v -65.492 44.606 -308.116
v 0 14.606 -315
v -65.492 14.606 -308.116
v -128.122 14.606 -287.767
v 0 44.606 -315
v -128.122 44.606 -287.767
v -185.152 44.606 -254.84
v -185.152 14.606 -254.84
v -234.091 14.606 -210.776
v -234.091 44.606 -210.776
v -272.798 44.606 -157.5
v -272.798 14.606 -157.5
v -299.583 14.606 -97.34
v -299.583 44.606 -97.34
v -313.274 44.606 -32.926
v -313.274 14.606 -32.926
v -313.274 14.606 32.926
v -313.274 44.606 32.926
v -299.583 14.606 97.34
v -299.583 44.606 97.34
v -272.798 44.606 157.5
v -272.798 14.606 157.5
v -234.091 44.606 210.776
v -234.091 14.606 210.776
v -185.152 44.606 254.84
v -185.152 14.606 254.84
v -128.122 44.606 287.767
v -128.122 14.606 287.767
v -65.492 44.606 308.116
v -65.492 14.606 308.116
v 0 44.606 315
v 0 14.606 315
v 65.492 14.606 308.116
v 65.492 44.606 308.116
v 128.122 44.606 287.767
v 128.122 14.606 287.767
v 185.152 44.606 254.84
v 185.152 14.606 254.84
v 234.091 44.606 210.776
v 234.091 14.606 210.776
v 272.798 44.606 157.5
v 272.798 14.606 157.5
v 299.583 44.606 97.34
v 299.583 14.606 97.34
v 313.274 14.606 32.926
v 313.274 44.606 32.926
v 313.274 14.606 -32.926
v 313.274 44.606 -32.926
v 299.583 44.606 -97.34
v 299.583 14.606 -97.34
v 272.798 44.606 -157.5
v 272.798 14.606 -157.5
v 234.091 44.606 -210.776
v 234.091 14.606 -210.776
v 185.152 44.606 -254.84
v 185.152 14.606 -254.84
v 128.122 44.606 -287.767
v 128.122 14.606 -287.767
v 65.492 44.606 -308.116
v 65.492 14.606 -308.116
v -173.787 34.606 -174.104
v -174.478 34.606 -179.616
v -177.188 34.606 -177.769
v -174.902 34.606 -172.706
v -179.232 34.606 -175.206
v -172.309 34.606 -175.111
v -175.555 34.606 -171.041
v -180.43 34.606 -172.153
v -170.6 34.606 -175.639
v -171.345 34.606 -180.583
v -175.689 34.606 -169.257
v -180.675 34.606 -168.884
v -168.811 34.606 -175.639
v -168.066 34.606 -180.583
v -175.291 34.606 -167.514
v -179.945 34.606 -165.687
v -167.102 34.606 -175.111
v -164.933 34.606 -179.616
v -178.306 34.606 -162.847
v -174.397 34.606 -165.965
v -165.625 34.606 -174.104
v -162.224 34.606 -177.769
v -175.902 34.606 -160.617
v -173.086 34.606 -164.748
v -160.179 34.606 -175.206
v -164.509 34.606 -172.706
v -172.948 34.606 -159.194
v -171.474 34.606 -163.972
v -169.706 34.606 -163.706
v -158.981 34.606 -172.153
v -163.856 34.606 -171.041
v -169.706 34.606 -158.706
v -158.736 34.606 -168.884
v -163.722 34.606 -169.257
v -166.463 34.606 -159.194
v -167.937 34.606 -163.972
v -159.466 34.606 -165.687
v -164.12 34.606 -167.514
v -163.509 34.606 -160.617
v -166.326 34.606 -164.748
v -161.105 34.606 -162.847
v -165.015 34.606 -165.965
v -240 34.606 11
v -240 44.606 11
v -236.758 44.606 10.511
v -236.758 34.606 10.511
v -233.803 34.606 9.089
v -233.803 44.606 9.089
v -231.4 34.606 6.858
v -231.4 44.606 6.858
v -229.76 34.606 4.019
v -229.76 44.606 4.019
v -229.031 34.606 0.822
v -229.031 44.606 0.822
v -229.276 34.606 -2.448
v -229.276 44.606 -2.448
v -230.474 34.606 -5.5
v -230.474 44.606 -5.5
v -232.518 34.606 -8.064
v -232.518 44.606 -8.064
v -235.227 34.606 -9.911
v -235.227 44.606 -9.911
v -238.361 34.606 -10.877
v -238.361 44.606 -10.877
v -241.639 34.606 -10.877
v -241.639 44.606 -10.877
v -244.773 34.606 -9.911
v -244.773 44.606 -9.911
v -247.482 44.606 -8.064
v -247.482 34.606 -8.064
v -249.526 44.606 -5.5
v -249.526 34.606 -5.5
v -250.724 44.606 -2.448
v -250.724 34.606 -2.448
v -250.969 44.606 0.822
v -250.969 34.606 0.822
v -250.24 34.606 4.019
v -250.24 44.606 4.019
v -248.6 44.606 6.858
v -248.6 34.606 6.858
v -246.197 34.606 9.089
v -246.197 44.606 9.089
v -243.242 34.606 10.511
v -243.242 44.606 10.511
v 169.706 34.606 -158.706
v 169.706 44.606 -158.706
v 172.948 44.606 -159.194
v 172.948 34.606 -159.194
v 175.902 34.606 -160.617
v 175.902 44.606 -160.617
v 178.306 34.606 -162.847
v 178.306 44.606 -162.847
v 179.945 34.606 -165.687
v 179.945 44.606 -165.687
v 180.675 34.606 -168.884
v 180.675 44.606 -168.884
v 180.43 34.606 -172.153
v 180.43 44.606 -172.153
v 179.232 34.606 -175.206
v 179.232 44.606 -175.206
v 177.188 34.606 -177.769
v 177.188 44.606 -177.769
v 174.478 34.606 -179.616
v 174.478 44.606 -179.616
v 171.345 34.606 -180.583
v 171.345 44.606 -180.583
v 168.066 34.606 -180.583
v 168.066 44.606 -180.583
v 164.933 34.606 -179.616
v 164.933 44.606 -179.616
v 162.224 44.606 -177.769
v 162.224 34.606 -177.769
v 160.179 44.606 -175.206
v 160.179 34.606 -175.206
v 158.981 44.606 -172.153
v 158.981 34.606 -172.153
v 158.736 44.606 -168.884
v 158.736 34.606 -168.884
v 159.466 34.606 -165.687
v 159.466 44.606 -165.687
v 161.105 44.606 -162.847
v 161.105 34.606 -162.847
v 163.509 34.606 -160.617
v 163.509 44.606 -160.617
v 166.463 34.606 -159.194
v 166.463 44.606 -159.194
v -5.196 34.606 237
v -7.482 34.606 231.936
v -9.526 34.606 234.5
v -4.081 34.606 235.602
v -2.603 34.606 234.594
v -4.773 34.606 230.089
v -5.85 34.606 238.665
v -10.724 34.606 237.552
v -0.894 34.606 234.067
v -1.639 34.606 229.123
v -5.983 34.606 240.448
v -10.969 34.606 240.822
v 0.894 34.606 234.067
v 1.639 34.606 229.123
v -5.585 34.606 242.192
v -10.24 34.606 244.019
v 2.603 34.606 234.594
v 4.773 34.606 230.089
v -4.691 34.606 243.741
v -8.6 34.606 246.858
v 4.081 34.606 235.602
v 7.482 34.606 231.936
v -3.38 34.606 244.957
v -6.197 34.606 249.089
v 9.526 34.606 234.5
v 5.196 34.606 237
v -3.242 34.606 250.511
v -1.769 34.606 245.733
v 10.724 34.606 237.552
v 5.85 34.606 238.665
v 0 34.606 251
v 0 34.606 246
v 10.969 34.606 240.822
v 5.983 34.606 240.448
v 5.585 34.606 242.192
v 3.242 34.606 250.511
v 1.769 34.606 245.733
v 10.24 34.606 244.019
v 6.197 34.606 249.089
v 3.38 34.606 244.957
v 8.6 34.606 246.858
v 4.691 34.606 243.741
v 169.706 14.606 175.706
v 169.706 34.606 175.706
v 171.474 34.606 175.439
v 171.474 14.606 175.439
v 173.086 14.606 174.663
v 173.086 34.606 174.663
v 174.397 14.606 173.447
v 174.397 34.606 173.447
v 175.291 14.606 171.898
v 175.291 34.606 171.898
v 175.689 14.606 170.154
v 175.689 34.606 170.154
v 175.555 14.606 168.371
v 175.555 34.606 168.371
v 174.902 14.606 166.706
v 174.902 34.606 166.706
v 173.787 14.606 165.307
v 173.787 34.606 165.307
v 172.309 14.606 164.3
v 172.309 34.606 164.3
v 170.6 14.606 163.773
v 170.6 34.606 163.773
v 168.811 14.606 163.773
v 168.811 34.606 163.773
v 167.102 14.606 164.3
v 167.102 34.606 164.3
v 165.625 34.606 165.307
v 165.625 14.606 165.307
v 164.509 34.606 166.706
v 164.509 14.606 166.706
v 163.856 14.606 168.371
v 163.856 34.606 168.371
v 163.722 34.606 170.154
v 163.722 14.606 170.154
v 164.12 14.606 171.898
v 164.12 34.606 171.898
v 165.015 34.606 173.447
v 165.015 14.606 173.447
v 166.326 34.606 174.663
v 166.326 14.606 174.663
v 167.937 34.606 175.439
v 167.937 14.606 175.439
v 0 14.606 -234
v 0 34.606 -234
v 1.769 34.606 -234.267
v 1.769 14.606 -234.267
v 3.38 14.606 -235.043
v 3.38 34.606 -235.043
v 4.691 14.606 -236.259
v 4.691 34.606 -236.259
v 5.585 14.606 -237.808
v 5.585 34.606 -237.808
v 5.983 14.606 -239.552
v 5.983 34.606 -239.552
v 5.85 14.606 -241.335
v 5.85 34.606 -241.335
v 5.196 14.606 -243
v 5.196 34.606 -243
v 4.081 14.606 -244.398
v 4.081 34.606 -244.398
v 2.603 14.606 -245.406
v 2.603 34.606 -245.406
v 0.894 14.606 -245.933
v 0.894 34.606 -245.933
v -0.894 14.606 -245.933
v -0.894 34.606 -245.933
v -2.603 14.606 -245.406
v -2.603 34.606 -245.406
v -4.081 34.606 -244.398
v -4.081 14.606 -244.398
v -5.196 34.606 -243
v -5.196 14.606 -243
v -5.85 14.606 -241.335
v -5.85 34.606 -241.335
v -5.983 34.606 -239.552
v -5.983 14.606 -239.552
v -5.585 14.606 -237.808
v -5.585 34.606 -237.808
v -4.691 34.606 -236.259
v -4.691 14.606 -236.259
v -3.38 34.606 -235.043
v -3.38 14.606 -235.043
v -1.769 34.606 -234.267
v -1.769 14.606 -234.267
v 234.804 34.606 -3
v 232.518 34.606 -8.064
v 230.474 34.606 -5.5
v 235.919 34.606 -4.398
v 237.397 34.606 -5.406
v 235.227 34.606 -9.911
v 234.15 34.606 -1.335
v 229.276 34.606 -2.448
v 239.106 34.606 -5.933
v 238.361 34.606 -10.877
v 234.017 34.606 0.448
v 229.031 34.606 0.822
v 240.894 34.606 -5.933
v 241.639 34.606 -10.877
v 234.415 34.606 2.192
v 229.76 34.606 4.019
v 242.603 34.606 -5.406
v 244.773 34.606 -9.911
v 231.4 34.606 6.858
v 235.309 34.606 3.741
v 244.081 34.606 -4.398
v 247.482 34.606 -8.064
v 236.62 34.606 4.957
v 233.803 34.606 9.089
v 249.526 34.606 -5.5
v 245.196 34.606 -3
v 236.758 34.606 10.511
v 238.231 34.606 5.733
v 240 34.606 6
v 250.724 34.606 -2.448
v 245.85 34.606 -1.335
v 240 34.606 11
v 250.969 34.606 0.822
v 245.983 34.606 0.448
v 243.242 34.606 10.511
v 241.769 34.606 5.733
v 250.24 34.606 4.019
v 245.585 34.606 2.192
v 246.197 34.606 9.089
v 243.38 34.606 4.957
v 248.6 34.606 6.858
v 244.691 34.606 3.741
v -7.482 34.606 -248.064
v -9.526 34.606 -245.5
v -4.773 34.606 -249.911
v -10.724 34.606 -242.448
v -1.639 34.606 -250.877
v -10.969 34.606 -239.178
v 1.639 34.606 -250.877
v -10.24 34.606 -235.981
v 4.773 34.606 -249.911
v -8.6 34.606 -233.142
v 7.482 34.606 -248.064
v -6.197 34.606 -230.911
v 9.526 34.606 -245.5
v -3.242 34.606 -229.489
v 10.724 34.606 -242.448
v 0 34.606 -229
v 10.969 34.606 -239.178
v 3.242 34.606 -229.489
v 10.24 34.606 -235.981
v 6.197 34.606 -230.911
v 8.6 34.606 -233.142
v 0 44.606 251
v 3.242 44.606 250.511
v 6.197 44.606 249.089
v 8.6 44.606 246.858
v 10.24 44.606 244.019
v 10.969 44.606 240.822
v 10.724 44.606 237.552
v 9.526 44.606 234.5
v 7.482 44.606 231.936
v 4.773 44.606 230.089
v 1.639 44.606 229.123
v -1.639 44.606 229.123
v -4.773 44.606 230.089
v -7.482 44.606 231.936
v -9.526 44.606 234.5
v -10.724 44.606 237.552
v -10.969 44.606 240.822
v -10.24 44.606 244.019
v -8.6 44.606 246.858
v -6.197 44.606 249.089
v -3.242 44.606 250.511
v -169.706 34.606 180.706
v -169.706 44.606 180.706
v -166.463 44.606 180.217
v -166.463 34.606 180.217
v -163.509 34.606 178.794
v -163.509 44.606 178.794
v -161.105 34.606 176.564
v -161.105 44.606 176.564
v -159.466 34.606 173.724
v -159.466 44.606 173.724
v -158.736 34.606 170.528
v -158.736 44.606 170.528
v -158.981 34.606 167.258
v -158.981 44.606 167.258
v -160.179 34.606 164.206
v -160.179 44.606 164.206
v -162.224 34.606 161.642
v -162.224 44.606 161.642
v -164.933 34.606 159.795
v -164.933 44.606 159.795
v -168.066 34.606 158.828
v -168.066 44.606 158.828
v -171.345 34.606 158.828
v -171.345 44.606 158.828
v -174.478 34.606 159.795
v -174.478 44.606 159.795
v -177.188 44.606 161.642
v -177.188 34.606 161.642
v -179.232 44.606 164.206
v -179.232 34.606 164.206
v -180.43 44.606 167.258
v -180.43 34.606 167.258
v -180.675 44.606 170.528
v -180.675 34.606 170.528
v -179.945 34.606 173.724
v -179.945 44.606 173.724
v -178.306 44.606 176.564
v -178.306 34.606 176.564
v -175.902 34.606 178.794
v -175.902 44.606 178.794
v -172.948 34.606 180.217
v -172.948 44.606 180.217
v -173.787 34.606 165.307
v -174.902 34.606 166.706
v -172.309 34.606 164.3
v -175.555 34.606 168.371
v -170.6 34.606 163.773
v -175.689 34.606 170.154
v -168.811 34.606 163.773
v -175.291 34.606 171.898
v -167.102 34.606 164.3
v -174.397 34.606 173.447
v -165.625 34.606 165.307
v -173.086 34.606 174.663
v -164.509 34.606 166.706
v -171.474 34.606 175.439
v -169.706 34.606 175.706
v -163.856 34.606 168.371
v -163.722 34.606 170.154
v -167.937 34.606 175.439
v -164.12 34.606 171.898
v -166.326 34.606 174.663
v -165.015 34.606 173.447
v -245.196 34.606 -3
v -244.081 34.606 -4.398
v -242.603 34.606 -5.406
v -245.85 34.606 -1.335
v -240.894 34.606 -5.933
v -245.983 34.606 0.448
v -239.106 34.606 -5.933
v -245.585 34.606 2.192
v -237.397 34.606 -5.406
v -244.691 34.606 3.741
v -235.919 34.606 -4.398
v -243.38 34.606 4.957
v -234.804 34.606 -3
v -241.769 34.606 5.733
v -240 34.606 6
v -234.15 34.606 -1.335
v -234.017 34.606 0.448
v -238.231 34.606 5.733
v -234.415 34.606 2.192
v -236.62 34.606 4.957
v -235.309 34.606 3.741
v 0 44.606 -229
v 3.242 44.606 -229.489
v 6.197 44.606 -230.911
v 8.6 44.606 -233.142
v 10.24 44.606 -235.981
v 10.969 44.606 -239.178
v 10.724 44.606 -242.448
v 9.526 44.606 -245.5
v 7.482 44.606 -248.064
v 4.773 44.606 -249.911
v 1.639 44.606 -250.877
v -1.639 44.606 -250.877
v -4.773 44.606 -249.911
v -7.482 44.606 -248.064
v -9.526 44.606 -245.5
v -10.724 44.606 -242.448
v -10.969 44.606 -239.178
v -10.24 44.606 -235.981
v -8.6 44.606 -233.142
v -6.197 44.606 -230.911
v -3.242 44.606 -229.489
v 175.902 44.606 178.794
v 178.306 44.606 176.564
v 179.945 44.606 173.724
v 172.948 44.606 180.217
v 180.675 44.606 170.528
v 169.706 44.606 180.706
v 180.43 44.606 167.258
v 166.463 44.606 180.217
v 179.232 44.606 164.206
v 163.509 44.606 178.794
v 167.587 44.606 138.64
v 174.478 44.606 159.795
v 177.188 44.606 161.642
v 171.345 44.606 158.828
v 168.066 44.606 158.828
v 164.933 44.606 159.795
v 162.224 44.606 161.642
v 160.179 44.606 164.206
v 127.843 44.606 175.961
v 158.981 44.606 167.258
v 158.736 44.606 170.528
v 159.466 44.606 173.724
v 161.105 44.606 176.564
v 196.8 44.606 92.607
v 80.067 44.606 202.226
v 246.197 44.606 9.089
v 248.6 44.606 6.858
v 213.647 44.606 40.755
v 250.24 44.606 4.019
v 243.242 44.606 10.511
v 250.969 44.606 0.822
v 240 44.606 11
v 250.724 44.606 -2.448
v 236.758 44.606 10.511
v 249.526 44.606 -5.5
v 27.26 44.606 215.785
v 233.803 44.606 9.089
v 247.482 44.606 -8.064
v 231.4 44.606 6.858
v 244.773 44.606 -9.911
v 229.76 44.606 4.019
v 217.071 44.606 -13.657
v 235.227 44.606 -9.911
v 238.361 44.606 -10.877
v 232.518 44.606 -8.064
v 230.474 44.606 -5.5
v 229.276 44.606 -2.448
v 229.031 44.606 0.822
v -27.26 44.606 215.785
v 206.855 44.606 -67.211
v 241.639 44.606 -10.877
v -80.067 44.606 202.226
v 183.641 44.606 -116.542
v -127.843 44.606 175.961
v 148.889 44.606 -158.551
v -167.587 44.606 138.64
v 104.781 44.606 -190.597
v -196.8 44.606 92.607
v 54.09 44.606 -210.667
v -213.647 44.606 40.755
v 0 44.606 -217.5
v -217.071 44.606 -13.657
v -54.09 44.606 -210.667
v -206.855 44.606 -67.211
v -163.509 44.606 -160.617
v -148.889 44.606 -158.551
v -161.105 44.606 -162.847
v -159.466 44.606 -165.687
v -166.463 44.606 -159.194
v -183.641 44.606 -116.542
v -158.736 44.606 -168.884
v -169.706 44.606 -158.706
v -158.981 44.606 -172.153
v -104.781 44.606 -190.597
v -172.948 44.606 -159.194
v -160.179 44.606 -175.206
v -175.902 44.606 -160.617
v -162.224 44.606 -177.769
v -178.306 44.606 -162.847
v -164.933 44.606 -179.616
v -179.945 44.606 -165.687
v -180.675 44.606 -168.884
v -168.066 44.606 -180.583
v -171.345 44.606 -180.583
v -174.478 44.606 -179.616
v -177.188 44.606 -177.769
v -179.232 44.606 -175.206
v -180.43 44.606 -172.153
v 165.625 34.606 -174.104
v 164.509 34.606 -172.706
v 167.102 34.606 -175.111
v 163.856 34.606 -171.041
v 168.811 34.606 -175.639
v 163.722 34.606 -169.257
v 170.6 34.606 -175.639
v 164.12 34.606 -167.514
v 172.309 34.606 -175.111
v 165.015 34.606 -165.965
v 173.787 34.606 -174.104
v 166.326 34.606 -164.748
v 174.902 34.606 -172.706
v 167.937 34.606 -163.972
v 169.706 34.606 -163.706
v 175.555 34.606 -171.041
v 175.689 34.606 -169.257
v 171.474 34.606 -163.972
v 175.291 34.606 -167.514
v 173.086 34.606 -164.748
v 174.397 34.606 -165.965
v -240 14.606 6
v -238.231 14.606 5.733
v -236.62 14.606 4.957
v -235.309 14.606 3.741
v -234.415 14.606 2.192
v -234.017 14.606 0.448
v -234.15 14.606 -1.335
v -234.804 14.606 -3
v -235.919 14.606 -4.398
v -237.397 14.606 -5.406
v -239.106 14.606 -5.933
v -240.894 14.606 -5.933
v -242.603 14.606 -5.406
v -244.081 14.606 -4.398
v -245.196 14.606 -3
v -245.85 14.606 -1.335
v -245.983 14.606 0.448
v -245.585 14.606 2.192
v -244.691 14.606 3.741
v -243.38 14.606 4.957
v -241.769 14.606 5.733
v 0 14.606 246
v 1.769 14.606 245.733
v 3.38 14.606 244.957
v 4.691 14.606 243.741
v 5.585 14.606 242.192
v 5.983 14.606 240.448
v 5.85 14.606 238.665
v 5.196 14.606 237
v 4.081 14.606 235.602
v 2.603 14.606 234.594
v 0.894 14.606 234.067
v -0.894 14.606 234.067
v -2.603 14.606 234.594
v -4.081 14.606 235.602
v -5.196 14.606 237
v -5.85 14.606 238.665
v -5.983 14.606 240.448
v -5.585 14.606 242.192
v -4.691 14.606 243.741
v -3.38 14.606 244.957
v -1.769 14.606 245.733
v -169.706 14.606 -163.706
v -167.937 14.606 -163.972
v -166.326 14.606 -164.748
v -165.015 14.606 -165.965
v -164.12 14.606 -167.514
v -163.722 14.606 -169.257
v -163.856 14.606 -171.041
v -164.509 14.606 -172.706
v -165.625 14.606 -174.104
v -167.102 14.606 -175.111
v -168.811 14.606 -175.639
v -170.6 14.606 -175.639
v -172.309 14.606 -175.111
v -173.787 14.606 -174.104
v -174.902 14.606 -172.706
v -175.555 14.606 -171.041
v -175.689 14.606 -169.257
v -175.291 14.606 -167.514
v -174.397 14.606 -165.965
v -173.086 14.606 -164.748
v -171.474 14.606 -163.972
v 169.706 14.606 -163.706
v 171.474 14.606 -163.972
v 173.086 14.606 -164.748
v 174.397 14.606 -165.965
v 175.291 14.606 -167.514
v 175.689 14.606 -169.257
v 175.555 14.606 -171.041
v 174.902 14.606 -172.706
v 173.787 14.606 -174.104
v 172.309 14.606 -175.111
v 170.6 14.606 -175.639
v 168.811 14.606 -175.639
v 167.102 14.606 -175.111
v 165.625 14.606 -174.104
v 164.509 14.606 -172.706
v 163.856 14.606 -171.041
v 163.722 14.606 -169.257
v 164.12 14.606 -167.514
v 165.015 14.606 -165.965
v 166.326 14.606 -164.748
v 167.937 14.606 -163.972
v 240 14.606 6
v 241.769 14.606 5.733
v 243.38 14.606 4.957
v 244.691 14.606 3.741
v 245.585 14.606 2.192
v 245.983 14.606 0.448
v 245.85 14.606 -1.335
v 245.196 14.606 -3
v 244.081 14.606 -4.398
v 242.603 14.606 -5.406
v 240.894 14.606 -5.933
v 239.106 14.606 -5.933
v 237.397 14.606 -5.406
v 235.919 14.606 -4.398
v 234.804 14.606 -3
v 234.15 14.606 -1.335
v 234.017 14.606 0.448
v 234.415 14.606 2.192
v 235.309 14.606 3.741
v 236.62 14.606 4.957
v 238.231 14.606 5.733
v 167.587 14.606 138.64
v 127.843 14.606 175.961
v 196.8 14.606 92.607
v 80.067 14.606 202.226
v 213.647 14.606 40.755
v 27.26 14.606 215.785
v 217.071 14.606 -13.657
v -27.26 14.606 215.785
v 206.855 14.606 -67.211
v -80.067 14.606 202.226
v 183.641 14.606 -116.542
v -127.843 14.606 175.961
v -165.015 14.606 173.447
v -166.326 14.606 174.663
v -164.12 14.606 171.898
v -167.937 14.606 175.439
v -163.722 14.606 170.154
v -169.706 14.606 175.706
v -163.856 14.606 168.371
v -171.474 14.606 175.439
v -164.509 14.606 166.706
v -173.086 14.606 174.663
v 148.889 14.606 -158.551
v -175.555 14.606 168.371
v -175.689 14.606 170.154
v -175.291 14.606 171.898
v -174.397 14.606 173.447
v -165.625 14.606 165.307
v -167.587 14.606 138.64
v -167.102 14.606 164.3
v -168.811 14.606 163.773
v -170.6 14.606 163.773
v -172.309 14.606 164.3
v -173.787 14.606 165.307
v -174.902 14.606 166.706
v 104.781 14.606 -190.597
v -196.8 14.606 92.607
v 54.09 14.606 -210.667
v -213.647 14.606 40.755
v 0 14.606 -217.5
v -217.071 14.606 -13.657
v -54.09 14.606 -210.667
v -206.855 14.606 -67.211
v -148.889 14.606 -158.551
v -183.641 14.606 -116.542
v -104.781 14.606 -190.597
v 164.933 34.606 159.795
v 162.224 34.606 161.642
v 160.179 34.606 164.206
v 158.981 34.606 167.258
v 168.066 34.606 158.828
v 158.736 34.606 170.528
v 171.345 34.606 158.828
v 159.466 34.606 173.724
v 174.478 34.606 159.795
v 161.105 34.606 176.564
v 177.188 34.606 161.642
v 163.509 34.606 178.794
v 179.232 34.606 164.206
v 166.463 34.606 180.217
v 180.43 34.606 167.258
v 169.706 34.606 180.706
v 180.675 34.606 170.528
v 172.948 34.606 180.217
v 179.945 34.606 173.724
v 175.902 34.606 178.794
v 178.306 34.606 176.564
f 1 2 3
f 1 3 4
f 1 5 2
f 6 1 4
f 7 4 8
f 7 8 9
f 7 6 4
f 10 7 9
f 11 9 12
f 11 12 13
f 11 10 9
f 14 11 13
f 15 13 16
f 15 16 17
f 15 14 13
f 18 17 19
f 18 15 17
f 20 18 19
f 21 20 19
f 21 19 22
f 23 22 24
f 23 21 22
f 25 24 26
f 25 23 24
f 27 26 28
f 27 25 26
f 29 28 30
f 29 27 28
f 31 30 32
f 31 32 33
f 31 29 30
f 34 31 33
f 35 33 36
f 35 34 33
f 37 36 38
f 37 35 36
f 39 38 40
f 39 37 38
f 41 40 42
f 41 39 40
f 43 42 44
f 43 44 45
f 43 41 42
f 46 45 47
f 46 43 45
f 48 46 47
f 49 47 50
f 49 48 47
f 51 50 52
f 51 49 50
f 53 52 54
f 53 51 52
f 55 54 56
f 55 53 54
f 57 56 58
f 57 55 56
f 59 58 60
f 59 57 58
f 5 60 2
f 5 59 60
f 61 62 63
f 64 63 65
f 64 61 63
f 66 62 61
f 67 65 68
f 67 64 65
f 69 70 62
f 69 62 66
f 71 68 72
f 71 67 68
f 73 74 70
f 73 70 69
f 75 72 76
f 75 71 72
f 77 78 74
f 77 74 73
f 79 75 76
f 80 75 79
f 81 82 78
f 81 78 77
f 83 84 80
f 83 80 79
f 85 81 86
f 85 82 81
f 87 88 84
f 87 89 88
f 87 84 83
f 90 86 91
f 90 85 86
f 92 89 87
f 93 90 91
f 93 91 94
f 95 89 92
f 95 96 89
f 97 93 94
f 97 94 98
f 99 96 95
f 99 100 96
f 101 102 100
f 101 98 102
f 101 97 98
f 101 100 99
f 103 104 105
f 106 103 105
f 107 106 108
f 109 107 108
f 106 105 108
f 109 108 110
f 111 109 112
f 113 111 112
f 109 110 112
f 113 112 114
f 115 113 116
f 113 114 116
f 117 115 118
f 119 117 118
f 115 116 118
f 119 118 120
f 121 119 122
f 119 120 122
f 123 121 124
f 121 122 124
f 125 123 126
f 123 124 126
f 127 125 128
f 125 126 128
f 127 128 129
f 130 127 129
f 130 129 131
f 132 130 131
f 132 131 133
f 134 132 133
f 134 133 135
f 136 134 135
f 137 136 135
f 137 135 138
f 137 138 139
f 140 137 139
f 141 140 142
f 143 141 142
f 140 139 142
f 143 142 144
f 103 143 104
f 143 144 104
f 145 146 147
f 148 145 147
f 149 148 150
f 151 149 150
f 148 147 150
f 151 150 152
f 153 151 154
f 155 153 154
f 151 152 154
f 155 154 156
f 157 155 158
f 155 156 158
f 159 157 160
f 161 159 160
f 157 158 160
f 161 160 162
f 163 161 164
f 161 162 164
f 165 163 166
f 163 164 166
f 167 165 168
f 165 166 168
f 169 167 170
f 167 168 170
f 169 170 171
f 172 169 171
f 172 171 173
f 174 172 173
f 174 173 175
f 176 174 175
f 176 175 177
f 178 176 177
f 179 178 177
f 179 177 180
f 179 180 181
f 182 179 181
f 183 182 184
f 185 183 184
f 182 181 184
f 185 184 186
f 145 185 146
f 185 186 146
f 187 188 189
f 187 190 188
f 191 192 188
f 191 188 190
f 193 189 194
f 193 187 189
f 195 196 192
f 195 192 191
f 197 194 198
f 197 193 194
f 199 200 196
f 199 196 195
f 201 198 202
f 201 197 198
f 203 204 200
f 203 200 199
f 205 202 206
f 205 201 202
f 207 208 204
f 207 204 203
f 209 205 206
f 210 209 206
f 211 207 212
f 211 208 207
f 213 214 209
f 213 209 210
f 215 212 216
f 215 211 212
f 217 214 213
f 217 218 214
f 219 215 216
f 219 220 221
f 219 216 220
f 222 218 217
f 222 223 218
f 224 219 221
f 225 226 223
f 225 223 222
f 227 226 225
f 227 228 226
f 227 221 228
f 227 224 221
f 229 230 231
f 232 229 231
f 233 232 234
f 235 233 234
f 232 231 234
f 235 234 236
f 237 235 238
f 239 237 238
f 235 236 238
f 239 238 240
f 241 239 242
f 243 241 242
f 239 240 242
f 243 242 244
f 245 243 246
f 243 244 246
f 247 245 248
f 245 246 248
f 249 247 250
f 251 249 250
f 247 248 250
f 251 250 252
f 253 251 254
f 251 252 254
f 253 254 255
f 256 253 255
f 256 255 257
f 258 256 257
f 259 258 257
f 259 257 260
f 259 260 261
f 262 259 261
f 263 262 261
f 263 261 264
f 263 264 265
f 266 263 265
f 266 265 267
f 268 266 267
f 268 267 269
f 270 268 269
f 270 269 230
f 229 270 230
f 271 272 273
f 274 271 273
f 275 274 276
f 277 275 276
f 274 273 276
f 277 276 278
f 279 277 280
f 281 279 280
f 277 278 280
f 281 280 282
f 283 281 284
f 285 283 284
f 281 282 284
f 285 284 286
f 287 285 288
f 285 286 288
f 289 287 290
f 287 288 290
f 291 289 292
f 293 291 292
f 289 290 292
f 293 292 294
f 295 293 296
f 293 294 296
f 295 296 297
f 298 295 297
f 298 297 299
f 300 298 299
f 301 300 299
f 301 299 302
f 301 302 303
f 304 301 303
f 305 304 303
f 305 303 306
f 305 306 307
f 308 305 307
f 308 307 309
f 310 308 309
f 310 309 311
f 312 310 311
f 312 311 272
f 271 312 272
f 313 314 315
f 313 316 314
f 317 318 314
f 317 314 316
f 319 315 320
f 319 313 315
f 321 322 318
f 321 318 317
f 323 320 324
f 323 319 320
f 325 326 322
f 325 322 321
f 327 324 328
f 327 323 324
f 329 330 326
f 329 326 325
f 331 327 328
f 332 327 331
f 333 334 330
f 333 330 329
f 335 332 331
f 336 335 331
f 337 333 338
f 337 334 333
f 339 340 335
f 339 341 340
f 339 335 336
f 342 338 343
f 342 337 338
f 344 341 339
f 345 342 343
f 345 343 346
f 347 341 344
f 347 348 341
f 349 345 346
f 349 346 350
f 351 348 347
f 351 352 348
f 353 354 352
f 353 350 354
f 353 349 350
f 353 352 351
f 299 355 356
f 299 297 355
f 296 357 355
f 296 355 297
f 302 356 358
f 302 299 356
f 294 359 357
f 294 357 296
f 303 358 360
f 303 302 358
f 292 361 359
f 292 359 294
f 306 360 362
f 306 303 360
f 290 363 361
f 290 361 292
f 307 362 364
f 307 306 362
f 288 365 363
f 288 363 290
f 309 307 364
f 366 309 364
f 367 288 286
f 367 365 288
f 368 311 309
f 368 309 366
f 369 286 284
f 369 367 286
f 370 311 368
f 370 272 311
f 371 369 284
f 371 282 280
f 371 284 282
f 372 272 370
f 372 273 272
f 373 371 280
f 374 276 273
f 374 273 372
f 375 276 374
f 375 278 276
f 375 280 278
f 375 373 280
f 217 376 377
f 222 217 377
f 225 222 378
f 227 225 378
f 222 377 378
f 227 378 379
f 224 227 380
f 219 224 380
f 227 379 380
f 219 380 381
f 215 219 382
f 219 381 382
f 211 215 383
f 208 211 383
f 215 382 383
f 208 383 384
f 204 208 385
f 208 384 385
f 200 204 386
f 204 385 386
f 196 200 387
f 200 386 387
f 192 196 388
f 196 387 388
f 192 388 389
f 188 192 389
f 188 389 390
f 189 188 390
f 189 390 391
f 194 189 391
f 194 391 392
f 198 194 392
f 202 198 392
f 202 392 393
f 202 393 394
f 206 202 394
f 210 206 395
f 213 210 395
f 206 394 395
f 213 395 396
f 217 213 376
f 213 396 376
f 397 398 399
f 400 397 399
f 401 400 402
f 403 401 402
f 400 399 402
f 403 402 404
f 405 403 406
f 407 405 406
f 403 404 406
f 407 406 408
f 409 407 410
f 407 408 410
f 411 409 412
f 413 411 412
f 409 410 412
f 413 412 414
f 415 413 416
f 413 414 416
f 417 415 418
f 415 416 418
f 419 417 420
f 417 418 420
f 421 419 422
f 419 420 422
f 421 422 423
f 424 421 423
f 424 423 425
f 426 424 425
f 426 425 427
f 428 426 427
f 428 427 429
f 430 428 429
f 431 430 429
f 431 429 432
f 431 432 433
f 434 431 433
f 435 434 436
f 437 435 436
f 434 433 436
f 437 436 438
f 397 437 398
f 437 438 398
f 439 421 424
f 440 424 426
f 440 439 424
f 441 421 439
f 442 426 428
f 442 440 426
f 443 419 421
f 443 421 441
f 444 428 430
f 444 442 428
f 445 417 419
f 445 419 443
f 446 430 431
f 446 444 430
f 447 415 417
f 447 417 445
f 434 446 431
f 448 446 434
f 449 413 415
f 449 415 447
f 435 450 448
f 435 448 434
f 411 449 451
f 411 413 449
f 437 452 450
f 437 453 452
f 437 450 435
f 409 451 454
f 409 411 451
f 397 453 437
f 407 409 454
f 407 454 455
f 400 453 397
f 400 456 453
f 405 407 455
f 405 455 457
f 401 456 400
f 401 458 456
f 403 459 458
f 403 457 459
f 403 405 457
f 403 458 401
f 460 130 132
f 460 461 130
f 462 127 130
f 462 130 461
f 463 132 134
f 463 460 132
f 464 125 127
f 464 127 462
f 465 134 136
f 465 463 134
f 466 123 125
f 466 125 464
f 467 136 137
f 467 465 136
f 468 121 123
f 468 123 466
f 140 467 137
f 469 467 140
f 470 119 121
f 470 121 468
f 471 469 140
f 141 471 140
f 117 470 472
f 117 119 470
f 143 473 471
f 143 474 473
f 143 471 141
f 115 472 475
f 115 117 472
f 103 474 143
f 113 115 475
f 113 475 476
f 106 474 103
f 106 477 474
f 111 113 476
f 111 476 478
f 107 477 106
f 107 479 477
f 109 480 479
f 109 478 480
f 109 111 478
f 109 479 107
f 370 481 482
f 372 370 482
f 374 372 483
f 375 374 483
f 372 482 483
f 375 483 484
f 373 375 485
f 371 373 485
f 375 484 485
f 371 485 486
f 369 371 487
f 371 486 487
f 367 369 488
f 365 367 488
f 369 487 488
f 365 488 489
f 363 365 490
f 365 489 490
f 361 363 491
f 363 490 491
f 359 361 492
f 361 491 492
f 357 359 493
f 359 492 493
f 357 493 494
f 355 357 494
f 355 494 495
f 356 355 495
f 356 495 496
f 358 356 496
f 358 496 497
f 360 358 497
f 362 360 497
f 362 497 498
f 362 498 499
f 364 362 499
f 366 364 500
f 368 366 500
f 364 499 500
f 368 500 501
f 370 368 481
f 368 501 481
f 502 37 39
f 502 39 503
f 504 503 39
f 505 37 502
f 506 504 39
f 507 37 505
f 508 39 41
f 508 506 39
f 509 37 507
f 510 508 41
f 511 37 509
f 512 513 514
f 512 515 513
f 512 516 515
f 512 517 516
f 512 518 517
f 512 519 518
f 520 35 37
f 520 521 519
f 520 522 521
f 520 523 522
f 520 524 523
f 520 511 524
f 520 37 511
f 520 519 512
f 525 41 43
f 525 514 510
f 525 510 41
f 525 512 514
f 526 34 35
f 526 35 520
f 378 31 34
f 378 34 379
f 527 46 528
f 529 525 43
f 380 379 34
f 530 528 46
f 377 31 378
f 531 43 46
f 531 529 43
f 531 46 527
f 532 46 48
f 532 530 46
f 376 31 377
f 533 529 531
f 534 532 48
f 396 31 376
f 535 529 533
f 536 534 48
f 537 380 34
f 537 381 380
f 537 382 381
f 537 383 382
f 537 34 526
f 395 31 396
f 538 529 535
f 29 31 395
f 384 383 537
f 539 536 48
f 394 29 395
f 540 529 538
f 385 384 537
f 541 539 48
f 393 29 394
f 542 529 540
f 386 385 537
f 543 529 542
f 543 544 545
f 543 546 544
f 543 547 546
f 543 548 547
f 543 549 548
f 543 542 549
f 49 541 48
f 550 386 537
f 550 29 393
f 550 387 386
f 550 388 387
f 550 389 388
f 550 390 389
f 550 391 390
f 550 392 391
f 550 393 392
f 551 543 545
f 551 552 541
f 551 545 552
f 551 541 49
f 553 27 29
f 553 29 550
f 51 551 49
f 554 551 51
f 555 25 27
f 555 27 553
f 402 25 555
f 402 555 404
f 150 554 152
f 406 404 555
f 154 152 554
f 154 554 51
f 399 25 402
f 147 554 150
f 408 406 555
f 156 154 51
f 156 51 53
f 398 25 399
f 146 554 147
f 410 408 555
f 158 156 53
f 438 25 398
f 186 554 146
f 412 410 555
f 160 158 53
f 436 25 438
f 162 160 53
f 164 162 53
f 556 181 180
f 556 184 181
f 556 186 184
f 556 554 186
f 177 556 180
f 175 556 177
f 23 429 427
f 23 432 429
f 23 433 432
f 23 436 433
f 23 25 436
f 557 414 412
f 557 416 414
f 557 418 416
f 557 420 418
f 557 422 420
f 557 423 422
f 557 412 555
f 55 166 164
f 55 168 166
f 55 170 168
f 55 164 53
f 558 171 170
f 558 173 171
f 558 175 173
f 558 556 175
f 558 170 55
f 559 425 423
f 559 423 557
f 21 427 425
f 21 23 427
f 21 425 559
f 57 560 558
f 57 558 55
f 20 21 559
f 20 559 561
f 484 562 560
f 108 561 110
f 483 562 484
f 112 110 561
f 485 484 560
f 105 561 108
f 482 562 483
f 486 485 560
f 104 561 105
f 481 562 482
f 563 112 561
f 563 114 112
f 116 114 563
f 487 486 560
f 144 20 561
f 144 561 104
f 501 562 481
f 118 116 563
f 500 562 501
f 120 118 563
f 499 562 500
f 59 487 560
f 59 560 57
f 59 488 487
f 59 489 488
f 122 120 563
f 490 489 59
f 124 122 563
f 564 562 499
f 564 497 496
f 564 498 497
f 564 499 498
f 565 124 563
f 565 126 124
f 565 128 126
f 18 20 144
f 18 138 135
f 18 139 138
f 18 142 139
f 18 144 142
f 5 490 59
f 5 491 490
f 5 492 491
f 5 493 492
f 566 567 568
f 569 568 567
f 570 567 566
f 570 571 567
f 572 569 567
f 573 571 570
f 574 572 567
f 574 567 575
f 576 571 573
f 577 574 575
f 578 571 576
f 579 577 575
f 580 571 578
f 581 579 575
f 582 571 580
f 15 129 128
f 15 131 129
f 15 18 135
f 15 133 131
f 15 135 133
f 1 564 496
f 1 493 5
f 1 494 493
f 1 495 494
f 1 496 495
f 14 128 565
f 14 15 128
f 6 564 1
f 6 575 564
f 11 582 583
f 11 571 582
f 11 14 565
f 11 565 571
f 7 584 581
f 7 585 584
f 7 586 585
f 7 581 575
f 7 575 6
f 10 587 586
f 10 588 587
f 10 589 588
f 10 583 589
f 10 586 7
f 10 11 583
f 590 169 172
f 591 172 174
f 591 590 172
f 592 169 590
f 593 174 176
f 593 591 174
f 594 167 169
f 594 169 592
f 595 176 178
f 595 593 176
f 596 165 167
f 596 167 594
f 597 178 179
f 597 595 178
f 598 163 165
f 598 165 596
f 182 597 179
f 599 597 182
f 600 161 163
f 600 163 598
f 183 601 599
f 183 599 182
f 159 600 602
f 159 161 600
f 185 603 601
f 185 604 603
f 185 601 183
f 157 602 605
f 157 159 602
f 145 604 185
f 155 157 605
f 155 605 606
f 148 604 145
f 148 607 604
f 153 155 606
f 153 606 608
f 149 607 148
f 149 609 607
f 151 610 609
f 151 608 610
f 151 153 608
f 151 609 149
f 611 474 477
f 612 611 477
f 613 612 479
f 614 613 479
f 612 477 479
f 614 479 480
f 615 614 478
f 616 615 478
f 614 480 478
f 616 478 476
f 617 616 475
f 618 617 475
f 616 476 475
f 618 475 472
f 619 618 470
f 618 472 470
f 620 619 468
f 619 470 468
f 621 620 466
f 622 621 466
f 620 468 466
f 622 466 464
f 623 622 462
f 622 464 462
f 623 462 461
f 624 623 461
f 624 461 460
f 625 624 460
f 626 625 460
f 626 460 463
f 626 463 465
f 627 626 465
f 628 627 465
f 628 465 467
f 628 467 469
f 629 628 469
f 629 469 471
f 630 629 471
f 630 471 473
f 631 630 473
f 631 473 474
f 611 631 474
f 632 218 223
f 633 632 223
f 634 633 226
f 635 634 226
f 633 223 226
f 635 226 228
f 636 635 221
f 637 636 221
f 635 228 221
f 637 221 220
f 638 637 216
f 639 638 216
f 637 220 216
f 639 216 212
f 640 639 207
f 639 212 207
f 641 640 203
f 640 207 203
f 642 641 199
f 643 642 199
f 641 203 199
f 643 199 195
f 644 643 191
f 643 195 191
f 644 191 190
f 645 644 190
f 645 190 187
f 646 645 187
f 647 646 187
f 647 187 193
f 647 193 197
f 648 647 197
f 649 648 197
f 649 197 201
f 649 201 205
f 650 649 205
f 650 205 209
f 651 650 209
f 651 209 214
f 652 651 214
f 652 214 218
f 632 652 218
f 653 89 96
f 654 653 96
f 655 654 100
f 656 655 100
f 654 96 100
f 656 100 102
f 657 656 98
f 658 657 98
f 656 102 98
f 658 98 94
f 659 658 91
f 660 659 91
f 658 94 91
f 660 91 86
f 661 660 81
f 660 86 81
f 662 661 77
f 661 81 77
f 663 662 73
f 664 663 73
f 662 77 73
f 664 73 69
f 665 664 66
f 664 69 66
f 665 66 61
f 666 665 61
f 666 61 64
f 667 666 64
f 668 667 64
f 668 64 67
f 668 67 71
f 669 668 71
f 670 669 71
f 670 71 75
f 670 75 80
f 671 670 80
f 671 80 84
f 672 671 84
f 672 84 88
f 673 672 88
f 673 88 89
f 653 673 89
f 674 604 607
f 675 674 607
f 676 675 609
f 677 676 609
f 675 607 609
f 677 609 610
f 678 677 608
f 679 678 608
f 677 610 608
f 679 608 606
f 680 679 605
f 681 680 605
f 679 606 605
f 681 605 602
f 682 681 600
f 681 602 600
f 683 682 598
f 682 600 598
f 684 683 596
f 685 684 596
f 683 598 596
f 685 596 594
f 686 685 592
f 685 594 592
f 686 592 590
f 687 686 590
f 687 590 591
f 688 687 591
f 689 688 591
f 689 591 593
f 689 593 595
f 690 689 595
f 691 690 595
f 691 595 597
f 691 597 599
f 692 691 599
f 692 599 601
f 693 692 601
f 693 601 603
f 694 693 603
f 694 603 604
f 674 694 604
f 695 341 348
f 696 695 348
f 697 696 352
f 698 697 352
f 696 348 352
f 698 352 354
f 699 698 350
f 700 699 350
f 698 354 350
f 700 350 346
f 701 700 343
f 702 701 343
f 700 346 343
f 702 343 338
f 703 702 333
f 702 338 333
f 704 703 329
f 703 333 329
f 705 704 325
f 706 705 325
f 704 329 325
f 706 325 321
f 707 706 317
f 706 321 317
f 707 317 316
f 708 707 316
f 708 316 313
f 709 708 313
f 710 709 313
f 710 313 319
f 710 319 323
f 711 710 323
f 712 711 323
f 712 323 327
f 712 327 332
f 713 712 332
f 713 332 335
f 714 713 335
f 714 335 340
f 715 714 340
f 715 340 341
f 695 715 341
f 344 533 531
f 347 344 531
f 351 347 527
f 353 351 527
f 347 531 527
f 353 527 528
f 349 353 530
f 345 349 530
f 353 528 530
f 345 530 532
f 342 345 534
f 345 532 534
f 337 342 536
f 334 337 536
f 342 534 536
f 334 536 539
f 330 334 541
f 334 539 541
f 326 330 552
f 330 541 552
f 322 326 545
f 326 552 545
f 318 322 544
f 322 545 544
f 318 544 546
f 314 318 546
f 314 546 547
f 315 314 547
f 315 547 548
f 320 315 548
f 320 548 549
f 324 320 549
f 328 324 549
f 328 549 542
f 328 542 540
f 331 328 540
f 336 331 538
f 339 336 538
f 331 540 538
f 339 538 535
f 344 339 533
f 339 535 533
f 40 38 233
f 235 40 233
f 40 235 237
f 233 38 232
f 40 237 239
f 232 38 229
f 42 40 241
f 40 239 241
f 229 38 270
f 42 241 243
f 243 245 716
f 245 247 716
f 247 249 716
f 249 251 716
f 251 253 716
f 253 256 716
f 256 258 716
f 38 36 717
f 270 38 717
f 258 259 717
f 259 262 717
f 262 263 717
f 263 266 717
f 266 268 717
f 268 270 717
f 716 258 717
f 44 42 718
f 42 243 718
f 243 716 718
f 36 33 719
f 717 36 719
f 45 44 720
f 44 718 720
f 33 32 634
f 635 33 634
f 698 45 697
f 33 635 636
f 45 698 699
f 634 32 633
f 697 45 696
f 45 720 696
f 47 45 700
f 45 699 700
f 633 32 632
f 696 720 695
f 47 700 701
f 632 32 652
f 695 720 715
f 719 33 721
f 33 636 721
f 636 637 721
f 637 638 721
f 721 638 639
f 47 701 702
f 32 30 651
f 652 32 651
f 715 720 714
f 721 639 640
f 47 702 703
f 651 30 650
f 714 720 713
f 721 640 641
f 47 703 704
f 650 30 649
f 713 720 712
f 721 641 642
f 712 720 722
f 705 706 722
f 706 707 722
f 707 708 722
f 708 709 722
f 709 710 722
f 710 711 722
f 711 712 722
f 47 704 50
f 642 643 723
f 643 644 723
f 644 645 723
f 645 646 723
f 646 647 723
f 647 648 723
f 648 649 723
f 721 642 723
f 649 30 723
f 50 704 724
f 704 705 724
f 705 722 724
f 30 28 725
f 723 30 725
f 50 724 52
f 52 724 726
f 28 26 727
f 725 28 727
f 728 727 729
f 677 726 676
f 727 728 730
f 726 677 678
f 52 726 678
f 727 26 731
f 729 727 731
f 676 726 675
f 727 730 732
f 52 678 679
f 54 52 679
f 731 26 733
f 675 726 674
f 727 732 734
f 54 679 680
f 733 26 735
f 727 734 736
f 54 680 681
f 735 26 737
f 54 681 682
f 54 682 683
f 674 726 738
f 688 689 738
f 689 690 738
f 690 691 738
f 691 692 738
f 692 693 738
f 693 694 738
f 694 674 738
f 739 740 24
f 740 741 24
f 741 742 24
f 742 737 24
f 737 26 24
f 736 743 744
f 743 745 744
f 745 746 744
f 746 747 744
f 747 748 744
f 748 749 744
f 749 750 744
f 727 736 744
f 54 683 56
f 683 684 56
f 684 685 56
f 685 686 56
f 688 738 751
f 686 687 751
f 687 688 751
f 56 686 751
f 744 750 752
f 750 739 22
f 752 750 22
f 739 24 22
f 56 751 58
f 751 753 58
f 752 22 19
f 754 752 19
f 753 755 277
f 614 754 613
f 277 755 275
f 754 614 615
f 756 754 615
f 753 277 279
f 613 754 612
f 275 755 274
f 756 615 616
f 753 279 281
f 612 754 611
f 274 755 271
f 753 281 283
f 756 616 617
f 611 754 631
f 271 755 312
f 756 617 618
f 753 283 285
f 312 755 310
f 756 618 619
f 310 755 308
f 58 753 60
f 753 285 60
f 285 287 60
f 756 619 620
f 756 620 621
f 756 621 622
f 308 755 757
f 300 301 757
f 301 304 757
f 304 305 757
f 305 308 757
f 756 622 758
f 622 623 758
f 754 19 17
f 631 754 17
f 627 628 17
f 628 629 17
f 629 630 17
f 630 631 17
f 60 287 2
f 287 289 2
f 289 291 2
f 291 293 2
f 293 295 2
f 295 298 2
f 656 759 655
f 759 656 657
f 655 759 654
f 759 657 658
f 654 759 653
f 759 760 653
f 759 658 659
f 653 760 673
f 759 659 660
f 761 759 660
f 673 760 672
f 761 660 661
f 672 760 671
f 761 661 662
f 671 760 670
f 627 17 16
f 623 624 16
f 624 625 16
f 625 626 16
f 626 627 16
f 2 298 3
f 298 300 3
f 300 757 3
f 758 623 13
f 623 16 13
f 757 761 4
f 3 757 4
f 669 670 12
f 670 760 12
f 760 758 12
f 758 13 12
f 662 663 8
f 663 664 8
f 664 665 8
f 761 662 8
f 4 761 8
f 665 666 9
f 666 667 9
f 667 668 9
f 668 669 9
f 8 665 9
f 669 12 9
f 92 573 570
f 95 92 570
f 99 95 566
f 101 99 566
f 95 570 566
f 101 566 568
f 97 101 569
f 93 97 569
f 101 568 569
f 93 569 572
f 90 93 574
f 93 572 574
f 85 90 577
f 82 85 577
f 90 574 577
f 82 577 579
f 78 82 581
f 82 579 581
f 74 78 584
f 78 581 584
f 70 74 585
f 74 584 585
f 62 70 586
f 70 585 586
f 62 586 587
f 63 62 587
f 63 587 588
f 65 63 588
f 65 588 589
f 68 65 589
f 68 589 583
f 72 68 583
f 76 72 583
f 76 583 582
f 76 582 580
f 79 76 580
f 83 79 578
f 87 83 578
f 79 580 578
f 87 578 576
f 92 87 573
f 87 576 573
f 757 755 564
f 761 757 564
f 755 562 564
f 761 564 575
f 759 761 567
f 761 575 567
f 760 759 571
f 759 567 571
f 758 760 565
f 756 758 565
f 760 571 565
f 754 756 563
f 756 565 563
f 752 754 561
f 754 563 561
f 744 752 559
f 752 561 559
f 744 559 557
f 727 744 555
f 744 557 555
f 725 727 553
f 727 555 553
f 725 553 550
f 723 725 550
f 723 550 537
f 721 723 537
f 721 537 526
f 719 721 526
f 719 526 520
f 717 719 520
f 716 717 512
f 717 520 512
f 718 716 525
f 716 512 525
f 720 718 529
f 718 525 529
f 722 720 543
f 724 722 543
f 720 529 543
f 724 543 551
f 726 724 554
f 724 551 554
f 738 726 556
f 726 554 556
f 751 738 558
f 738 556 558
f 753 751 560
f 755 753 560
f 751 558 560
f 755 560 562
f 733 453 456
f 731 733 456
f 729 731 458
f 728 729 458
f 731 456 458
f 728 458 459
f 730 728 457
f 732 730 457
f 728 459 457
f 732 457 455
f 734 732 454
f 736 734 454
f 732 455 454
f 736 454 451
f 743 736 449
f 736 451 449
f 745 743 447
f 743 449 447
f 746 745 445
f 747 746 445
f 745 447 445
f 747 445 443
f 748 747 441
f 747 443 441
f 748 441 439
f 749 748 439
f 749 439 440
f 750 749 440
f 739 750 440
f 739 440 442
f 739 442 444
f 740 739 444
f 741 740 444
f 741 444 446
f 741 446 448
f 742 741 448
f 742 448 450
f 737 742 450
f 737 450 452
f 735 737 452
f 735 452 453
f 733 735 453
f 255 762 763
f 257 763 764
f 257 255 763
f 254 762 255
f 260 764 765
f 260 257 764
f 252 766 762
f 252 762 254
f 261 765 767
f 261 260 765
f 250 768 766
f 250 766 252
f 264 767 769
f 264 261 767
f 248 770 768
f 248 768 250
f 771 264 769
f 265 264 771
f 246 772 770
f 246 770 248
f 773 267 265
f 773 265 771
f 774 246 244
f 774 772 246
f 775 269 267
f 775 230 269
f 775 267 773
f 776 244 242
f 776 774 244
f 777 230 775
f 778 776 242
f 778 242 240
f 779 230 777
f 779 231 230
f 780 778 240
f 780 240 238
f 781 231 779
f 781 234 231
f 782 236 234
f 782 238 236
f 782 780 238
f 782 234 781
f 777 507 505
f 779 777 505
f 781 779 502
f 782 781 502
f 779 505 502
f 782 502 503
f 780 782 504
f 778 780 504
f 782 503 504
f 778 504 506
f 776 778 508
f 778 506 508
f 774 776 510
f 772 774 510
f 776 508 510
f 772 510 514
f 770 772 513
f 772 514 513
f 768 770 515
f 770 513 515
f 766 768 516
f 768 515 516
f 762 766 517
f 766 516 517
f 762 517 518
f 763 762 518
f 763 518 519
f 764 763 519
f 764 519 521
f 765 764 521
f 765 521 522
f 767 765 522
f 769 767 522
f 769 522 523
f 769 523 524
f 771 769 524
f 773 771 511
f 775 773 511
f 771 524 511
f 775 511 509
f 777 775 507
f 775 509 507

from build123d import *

# Parameters (mm, degrees)
SKETCH1_W          = 97.5
SKETCH1_H          = 30
SKETCH2_R          = 11
CUT_EXTRUDE1_DEPTH = 10
SKETCH3_R          = 6
CUT_EXTRUDE2_DEPTH = 447.486281987


with BuildPart() as part:
    # Sketch1 → Revolve1 (revolve)
    with BuildSketch(Plane(origin=(0, 0, 0), x_dir=(0, 0, -1), z_dir=(1, 0, 0)), mode=Mode.PRIVATE) as revolve1_sk:
        with Locations((-266.250000002, 29.605962764)):
            Rectangle(SKETCH1_W, SKETCH1_H)
    revolve(revolve1_sk.sketch.rotate(Axis((0, -1000, 0), (0, 1, 0)), 180), axis=Axis((0, -1000, 0), (0, 1, 0)))

    # Sketch2 → Cut-Extrude1 (cut)
    with BuildSketch(Plane(origin=(0, 44.605962764, 0), x_dir=(1, 0, 0), z_dir=(0, 1, 0))):
        with Locations(Location((0, 240, 0), (0, 0, 270))):
            Circle(SKETCH2_R)
        with Locations(Location((169.705627485, 169.705627485, 0), (0, 0, 270))):
            Circle(SKETCH2_R)
        with Locations(Location((240, 0, 0), (0, 0, 270))):
            Circle(SKETCH2_R)
        with Locations(Location((169.705627485, -169.705627485, 0), (0, 0, 270))):
            Circle(SKETCH2_R)
        with Locations(Location((0, -240, 0), (0, 0, 270))):
            Circle(SKETCH2_R)
        with Locations(Location((-169.705627485, -169.705627485, 0), (0, 0, 270))):
            Circle(SKETCH2_R)
        with Locations(Location((-240, 0, 0), (0, 0, 270))):
            Circle(SKETCH2_R)
        with Locations(Location((-169.705627485, 169.705627485, 0), (0, 0, 270))):
            Circle(SKETCH2_R)
    extrude(amount=-CUT_EXTRUDE1_DEPTH, mode=Mode.SUBTRACT)

    # Sketch3 → Cut-Extrude2 (cut, through all)
    with BuildSketch(Plane(origin=(0, 44.605962764, 0), x_dir=(1, 0, 0), z_dir=(0, 1, 0))):
        with Locations(Location((0, 240, 0), (0, 0, 270))):
            Circle(SKETCH3_R)
        with Locations(Location((169.705627485, 169.705627485, 0), (0, 0, 270))):
            Circle(SKETCH3_R)
        with Locations(Location((240, 0, 0), (0, 0, 270))):
            Circle(SKETCH3_R)
        with Locations(Location((169.705627485, -169.705627485, 0), (0, 0, 270))):
            Circle(SKETCH3_R)
        with Locations(Location((0, -240, 0), (0, 0, 270))):
            Circle(SKETCH3_R)
        with Locations(Location((-169.705627485, -169.705627485, 0), (0, 0, 270))):
            Circle(SKETCH3_R)
        with Locations(Location((-240, 0, 0), (0, 0, 270))):
            Circle(SKETCH3_R)
        with Locations(Location((-169.705627485, 169.705627485, 0), (0, 0, 270))):
            Circle(SKETCH3_R)
    extrude(amount=-CUT_EXTRUDE2_DEPTH, mode=Mode.SUBTRACT)


solid = part.part
